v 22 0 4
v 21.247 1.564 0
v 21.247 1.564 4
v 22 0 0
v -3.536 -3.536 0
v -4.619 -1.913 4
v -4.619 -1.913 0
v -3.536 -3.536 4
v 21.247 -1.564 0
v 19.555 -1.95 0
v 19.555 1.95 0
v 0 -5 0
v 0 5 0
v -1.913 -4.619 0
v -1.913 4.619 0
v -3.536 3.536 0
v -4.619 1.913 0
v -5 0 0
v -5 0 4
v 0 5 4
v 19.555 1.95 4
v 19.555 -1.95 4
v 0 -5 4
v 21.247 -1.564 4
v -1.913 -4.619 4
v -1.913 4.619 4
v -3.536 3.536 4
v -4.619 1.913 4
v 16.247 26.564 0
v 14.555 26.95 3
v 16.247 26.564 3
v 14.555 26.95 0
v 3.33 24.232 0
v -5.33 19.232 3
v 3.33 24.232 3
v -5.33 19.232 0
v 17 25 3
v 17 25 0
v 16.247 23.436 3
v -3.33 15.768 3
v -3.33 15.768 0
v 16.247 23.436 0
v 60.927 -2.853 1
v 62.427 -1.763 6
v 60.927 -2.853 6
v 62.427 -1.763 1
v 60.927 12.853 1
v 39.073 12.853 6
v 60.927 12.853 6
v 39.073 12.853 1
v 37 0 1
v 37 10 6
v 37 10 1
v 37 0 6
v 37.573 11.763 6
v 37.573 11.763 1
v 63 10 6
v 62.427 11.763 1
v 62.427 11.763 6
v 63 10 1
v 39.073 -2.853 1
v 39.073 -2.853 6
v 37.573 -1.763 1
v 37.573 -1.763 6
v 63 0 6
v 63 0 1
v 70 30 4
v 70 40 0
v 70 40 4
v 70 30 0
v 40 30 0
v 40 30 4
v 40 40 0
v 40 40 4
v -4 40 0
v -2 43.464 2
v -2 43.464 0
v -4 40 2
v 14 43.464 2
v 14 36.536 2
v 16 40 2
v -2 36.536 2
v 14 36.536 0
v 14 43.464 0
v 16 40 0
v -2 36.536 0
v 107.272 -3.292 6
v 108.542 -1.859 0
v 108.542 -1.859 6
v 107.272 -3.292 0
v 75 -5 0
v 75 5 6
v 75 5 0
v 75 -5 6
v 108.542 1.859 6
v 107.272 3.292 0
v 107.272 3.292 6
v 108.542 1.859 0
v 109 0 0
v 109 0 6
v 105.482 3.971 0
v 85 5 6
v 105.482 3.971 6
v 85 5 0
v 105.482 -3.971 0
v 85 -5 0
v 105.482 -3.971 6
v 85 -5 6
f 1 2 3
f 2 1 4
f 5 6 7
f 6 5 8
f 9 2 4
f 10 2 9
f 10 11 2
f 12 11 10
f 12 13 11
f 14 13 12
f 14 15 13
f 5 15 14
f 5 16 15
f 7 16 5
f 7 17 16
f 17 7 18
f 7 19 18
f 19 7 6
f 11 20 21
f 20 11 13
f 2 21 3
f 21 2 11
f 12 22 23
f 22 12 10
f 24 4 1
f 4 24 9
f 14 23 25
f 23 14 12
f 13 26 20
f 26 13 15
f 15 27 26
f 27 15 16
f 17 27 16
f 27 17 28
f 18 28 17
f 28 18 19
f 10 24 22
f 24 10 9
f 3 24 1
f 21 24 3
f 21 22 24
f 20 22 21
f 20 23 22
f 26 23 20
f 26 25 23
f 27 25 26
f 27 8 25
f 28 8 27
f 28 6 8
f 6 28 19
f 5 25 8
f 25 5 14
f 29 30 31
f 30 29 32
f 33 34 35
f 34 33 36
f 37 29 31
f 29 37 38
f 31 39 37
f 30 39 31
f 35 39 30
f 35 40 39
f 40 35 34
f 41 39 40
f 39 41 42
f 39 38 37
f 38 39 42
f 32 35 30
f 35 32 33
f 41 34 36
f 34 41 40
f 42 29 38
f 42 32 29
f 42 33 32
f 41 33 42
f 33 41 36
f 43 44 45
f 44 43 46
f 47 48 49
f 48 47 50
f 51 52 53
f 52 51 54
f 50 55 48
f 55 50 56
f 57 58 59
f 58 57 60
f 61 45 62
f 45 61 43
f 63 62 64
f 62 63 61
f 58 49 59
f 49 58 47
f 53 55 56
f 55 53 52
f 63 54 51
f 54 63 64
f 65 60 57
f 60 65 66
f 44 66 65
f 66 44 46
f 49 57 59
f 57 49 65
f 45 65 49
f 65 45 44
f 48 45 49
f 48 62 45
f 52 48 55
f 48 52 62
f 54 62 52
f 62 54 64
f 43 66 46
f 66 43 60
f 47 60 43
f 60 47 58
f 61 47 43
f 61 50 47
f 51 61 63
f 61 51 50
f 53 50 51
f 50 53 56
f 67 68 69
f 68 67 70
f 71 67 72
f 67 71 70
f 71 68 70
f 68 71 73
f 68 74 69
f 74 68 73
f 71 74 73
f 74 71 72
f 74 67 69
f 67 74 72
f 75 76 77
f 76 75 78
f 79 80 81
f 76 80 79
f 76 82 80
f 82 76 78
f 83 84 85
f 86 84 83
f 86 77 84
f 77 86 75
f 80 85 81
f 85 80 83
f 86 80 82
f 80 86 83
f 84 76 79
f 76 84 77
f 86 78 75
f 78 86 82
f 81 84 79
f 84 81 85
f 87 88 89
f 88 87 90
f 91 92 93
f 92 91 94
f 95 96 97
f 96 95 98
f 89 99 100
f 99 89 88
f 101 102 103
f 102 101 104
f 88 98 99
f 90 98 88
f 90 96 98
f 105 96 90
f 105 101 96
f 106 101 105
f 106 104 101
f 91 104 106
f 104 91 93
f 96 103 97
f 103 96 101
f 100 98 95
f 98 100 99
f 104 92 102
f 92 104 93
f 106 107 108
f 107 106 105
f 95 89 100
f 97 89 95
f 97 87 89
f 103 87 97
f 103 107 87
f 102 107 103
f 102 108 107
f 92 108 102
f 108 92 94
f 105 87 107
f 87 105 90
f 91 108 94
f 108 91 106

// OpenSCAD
// hull(): exact 2D convex hulls (lines + arcs) and upright prisms sharing one z-range
linear_extrude(4) hull() { circle(5); translate([20, 0]) circle(2); }
translate([0, 20, 0]) linear_extrude(3) hull() { rotate(30) square([10, 4], center = true); translate([15, 5]) circle(2); }
translate([40, 0, 0]) hull() for (p = [[0, 0], [20, 0], [20, 10], [0, 10]]) translate([p[0], p[1], 1]) cylinder(r = 3, h = 5);
translate([40, 30, 0]) hull() { cube([10, 10, 4]); translate([20, 0, 0]) cube([10, 10, 4]); }
translate([0, 40, 0]) linear_extrude(2) hull() { circle(4, $fn = 6); translate([12, 0]) circle(4, $fn = 6); }
translate([80, 0, 0]) hull() { translate([-5, -5, 0]) cube([10, 10, 6]); translate([25, 0, 0]) cylinder(r = 4, h = 6); }
